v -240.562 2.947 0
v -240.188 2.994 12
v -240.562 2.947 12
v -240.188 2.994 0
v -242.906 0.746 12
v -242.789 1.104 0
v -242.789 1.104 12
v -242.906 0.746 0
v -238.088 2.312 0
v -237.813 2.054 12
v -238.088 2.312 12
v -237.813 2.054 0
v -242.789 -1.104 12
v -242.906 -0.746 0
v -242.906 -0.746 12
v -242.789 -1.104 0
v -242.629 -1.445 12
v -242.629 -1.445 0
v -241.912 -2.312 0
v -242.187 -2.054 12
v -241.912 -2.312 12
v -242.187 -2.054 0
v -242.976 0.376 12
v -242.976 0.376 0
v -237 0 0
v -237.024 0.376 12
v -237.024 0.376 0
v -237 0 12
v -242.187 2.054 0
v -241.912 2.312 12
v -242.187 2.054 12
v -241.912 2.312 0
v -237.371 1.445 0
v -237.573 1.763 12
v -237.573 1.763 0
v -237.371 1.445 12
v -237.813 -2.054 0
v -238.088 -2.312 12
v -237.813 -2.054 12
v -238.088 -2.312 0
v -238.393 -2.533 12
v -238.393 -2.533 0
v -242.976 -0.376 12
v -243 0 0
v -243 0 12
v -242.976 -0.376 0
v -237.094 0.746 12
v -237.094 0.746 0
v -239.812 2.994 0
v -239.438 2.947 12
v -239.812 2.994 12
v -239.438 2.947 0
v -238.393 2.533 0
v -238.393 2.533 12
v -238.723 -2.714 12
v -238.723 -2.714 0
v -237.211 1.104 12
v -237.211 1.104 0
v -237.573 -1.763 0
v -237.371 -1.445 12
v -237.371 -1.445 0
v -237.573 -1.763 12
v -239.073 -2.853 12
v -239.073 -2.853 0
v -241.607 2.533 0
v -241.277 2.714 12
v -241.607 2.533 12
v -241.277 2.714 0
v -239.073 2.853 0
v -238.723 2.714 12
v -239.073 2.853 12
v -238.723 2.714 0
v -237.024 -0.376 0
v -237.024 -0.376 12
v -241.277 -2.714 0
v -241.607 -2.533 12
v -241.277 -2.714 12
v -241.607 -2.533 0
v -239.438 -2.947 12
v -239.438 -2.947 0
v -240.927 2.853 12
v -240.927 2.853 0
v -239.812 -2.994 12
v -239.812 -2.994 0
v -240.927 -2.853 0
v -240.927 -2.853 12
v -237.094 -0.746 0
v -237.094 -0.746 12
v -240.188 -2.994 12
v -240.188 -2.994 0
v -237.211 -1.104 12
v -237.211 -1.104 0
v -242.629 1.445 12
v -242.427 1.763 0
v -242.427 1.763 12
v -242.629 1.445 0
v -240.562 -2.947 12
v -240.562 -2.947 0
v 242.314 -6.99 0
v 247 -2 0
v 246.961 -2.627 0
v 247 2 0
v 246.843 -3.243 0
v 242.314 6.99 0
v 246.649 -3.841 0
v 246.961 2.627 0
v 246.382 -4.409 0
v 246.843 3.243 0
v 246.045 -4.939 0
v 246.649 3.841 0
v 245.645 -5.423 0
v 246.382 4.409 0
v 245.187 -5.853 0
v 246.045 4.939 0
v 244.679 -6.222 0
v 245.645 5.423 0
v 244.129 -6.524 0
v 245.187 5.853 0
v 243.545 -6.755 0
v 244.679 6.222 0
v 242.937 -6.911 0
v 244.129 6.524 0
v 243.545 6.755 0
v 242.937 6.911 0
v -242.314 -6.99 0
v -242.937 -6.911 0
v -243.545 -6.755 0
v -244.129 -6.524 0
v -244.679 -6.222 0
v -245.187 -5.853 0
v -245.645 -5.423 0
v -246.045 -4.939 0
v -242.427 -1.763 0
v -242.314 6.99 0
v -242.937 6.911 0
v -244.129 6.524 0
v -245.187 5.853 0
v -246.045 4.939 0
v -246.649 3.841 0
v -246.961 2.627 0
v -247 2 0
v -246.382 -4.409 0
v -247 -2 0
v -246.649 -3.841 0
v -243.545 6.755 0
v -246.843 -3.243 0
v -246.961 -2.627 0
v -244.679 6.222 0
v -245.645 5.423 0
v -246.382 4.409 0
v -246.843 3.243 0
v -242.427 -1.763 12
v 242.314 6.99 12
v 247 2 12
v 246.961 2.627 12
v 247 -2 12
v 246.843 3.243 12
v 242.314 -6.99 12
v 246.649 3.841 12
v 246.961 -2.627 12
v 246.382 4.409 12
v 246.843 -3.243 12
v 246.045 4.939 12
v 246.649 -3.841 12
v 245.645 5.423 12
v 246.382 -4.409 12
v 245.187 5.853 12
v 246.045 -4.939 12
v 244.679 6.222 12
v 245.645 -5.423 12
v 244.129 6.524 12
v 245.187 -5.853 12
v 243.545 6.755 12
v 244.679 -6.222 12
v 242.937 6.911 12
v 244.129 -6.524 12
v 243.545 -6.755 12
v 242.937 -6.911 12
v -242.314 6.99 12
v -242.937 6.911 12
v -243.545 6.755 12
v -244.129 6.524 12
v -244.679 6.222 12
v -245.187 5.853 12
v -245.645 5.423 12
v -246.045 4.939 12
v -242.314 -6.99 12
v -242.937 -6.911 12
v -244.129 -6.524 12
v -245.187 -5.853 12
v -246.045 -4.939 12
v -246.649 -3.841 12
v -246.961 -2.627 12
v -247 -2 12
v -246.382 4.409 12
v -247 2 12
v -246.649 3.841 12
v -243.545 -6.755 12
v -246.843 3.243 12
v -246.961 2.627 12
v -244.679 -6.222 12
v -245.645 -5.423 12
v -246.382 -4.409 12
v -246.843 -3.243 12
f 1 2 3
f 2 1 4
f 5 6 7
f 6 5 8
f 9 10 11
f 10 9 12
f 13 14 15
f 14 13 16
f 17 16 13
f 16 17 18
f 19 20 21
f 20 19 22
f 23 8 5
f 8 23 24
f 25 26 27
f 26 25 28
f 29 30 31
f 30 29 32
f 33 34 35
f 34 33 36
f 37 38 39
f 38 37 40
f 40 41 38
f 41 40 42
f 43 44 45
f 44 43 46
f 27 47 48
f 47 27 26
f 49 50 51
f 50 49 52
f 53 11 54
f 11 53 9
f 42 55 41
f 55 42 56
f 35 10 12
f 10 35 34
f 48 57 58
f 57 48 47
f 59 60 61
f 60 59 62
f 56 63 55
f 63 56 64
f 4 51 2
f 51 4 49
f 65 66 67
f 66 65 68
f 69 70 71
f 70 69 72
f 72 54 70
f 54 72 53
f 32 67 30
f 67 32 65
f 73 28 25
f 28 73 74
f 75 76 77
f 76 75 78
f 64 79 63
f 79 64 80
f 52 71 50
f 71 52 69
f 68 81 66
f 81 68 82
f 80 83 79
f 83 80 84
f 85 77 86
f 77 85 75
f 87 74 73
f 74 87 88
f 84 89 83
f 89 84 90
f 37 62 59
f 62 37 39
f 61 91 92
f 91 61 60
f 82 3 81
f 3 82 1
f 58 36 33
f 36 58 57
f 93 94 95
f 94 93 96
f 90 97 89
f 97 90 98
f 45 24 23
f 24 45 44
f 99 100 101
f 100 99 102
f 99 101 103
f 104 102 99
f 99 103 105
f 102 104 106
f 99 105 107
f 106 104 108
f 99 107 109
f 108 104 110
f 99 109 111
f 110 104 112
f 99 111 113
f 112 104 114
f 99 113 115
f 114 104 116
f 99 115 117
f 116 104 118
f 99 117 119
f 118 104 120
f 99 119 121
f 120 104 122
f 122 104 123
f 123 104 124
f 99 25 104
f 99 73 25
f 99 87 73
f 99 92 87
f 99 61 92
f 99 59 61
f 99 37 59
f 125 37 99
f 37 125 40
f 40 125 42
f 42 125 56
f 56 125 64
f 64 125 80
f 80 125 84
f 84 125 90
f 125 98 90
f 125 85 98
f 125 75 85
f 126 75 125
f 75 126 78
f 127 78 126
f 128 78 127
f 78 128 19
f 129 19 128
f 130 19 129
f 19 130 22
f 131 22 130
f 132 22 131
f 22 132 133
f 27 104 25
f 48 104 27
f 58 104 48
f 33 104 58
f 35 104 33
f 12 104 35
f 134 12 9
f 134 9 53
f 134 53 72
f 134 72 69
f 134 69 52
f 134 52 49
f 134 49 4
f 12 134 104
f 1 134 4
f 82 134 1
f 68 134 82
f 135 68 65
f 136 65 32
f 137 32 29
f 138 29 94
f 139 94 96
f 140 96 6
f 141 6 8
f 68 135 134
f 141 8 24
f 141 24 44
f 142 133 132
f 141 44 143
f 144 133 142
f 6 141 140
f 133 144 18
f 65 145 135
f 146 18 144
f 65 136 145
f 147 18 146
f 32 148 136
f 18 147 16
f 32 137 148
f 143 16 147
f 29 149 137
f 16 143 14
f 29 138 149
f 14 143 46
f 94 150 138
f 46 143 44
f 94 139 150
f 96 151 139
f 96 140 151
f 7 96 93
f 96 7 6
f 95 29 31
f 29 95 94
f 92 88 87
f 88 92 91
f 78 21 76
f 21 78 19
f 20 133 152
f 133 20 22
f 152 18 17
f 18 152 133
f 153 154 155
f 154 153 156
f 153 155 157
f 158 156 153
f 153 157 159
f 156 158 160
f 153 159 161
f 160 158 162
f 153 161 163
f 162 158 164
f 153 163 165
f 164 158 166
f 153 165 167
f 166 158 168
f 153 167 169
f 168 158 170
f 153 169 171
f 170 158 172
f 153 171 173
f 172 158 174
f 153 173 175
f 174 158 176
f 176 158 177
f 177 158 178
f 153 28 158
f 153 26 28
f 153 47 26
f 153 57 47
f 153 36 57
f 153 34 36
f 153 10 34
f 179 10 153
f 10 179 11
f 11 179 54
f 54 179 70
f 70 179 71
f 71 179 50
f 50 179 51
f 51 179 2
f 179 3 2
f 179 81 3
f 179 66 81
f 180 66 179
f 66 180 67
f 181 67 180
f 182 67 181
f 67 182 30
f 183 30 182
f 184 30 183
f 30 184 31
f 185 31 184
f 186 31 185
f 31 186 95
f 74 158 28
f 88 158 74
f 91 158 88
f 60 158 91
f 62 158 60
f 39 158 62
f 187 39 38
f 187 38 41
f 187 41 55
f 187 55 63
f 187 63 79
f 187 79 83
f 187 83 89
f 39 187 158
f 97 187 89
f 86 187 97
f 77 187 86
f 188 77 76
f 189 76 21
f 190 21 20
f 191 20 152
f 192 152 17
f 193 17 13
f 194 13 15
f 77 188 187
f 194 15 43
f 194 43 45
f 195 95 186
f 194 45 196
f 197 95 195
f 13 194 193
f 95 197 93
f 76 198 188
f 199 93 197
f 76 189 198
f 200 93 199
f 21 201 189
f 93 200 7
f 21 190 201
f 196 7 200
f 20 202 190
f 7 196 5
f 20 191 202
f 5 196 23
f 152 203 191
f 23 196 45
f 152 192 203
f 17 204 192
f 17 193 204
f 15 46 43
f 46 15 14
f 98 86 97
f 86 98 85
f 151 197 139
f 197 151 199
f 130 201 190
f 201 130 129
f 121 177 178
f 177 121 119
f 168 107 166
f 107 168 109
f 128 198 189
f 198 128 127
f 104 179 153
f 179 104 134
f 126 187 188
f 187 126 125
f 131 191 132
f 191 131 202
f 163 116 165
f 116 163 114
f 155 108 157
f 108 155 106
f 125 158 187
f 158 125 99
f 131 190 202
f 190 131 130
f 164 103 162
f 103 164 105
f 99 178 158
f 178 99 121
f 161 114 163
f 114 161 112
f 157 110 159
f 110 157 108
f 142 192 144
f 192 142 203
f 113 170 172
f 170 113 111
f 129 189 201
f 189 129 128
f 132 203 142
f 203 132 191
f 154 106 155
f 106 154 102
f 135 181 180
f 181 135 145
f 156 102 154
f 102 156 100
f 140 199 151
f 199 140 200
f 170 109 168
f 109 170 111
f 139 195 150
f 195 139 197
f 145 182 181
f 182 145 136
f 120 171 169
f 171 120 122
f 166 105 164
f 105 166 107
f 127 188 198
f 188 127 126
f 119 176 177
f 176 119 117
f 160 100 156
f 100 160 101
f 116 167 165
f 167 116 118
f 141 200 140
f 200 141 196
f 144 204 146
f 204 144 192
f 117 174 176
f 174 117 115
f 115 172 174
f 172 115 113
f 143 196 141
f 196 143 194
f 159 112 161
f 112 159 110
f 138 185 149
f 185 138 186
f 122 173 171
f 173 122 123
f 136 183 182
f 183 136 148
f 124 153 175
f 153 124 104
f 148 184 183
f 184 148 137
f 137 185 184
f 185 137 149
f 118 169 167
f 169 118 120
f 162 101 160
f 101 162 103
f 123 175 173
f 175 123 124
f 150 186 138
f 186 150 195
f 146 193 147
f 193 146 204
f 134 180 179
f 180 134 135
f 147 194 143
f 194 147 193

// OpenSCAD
$fn = 50;


difference() {
	union() {
		hull() {
			translate(v = [-242.0000000000, 2.0000000000, 0]) {
				cylinder(h = 12, r = 5);
			}
			translate(v = [242.0000000000, 2.0000000000, 0]) {
				cylinder(h = 12, r = 5);
			}
			translate(v = [-242.0000000000, -2.0000000000, 0]) {
				cylinder(h = 12, r = 5);
			}
			translate(v = [242.0000000000, -2.0000000000, 0]) {
				cylinder(h = 12, r = 5);
			}
		}
	}
	union() {
		translate(v = [-240.0000000000, 0.0000000000, 0]) {
			cylinder(h = 12, r = 3.0000000000);
		}
		translate(v = [-240.0000000000, 0.0000000000, 0]) {
			cylinder(h = 12, r = 1.5000000000);
		}
		translate(v = [-240.0000000000, 0.0000000000, 0]) {
			cylinder(h = 12, r = 1.5000000000);
		}
		translate(v = [-240.0000000000, 0.0000000000, 0]) {
			cylinder(h = 12, r = 1.5000000000);
		}
	}
}
